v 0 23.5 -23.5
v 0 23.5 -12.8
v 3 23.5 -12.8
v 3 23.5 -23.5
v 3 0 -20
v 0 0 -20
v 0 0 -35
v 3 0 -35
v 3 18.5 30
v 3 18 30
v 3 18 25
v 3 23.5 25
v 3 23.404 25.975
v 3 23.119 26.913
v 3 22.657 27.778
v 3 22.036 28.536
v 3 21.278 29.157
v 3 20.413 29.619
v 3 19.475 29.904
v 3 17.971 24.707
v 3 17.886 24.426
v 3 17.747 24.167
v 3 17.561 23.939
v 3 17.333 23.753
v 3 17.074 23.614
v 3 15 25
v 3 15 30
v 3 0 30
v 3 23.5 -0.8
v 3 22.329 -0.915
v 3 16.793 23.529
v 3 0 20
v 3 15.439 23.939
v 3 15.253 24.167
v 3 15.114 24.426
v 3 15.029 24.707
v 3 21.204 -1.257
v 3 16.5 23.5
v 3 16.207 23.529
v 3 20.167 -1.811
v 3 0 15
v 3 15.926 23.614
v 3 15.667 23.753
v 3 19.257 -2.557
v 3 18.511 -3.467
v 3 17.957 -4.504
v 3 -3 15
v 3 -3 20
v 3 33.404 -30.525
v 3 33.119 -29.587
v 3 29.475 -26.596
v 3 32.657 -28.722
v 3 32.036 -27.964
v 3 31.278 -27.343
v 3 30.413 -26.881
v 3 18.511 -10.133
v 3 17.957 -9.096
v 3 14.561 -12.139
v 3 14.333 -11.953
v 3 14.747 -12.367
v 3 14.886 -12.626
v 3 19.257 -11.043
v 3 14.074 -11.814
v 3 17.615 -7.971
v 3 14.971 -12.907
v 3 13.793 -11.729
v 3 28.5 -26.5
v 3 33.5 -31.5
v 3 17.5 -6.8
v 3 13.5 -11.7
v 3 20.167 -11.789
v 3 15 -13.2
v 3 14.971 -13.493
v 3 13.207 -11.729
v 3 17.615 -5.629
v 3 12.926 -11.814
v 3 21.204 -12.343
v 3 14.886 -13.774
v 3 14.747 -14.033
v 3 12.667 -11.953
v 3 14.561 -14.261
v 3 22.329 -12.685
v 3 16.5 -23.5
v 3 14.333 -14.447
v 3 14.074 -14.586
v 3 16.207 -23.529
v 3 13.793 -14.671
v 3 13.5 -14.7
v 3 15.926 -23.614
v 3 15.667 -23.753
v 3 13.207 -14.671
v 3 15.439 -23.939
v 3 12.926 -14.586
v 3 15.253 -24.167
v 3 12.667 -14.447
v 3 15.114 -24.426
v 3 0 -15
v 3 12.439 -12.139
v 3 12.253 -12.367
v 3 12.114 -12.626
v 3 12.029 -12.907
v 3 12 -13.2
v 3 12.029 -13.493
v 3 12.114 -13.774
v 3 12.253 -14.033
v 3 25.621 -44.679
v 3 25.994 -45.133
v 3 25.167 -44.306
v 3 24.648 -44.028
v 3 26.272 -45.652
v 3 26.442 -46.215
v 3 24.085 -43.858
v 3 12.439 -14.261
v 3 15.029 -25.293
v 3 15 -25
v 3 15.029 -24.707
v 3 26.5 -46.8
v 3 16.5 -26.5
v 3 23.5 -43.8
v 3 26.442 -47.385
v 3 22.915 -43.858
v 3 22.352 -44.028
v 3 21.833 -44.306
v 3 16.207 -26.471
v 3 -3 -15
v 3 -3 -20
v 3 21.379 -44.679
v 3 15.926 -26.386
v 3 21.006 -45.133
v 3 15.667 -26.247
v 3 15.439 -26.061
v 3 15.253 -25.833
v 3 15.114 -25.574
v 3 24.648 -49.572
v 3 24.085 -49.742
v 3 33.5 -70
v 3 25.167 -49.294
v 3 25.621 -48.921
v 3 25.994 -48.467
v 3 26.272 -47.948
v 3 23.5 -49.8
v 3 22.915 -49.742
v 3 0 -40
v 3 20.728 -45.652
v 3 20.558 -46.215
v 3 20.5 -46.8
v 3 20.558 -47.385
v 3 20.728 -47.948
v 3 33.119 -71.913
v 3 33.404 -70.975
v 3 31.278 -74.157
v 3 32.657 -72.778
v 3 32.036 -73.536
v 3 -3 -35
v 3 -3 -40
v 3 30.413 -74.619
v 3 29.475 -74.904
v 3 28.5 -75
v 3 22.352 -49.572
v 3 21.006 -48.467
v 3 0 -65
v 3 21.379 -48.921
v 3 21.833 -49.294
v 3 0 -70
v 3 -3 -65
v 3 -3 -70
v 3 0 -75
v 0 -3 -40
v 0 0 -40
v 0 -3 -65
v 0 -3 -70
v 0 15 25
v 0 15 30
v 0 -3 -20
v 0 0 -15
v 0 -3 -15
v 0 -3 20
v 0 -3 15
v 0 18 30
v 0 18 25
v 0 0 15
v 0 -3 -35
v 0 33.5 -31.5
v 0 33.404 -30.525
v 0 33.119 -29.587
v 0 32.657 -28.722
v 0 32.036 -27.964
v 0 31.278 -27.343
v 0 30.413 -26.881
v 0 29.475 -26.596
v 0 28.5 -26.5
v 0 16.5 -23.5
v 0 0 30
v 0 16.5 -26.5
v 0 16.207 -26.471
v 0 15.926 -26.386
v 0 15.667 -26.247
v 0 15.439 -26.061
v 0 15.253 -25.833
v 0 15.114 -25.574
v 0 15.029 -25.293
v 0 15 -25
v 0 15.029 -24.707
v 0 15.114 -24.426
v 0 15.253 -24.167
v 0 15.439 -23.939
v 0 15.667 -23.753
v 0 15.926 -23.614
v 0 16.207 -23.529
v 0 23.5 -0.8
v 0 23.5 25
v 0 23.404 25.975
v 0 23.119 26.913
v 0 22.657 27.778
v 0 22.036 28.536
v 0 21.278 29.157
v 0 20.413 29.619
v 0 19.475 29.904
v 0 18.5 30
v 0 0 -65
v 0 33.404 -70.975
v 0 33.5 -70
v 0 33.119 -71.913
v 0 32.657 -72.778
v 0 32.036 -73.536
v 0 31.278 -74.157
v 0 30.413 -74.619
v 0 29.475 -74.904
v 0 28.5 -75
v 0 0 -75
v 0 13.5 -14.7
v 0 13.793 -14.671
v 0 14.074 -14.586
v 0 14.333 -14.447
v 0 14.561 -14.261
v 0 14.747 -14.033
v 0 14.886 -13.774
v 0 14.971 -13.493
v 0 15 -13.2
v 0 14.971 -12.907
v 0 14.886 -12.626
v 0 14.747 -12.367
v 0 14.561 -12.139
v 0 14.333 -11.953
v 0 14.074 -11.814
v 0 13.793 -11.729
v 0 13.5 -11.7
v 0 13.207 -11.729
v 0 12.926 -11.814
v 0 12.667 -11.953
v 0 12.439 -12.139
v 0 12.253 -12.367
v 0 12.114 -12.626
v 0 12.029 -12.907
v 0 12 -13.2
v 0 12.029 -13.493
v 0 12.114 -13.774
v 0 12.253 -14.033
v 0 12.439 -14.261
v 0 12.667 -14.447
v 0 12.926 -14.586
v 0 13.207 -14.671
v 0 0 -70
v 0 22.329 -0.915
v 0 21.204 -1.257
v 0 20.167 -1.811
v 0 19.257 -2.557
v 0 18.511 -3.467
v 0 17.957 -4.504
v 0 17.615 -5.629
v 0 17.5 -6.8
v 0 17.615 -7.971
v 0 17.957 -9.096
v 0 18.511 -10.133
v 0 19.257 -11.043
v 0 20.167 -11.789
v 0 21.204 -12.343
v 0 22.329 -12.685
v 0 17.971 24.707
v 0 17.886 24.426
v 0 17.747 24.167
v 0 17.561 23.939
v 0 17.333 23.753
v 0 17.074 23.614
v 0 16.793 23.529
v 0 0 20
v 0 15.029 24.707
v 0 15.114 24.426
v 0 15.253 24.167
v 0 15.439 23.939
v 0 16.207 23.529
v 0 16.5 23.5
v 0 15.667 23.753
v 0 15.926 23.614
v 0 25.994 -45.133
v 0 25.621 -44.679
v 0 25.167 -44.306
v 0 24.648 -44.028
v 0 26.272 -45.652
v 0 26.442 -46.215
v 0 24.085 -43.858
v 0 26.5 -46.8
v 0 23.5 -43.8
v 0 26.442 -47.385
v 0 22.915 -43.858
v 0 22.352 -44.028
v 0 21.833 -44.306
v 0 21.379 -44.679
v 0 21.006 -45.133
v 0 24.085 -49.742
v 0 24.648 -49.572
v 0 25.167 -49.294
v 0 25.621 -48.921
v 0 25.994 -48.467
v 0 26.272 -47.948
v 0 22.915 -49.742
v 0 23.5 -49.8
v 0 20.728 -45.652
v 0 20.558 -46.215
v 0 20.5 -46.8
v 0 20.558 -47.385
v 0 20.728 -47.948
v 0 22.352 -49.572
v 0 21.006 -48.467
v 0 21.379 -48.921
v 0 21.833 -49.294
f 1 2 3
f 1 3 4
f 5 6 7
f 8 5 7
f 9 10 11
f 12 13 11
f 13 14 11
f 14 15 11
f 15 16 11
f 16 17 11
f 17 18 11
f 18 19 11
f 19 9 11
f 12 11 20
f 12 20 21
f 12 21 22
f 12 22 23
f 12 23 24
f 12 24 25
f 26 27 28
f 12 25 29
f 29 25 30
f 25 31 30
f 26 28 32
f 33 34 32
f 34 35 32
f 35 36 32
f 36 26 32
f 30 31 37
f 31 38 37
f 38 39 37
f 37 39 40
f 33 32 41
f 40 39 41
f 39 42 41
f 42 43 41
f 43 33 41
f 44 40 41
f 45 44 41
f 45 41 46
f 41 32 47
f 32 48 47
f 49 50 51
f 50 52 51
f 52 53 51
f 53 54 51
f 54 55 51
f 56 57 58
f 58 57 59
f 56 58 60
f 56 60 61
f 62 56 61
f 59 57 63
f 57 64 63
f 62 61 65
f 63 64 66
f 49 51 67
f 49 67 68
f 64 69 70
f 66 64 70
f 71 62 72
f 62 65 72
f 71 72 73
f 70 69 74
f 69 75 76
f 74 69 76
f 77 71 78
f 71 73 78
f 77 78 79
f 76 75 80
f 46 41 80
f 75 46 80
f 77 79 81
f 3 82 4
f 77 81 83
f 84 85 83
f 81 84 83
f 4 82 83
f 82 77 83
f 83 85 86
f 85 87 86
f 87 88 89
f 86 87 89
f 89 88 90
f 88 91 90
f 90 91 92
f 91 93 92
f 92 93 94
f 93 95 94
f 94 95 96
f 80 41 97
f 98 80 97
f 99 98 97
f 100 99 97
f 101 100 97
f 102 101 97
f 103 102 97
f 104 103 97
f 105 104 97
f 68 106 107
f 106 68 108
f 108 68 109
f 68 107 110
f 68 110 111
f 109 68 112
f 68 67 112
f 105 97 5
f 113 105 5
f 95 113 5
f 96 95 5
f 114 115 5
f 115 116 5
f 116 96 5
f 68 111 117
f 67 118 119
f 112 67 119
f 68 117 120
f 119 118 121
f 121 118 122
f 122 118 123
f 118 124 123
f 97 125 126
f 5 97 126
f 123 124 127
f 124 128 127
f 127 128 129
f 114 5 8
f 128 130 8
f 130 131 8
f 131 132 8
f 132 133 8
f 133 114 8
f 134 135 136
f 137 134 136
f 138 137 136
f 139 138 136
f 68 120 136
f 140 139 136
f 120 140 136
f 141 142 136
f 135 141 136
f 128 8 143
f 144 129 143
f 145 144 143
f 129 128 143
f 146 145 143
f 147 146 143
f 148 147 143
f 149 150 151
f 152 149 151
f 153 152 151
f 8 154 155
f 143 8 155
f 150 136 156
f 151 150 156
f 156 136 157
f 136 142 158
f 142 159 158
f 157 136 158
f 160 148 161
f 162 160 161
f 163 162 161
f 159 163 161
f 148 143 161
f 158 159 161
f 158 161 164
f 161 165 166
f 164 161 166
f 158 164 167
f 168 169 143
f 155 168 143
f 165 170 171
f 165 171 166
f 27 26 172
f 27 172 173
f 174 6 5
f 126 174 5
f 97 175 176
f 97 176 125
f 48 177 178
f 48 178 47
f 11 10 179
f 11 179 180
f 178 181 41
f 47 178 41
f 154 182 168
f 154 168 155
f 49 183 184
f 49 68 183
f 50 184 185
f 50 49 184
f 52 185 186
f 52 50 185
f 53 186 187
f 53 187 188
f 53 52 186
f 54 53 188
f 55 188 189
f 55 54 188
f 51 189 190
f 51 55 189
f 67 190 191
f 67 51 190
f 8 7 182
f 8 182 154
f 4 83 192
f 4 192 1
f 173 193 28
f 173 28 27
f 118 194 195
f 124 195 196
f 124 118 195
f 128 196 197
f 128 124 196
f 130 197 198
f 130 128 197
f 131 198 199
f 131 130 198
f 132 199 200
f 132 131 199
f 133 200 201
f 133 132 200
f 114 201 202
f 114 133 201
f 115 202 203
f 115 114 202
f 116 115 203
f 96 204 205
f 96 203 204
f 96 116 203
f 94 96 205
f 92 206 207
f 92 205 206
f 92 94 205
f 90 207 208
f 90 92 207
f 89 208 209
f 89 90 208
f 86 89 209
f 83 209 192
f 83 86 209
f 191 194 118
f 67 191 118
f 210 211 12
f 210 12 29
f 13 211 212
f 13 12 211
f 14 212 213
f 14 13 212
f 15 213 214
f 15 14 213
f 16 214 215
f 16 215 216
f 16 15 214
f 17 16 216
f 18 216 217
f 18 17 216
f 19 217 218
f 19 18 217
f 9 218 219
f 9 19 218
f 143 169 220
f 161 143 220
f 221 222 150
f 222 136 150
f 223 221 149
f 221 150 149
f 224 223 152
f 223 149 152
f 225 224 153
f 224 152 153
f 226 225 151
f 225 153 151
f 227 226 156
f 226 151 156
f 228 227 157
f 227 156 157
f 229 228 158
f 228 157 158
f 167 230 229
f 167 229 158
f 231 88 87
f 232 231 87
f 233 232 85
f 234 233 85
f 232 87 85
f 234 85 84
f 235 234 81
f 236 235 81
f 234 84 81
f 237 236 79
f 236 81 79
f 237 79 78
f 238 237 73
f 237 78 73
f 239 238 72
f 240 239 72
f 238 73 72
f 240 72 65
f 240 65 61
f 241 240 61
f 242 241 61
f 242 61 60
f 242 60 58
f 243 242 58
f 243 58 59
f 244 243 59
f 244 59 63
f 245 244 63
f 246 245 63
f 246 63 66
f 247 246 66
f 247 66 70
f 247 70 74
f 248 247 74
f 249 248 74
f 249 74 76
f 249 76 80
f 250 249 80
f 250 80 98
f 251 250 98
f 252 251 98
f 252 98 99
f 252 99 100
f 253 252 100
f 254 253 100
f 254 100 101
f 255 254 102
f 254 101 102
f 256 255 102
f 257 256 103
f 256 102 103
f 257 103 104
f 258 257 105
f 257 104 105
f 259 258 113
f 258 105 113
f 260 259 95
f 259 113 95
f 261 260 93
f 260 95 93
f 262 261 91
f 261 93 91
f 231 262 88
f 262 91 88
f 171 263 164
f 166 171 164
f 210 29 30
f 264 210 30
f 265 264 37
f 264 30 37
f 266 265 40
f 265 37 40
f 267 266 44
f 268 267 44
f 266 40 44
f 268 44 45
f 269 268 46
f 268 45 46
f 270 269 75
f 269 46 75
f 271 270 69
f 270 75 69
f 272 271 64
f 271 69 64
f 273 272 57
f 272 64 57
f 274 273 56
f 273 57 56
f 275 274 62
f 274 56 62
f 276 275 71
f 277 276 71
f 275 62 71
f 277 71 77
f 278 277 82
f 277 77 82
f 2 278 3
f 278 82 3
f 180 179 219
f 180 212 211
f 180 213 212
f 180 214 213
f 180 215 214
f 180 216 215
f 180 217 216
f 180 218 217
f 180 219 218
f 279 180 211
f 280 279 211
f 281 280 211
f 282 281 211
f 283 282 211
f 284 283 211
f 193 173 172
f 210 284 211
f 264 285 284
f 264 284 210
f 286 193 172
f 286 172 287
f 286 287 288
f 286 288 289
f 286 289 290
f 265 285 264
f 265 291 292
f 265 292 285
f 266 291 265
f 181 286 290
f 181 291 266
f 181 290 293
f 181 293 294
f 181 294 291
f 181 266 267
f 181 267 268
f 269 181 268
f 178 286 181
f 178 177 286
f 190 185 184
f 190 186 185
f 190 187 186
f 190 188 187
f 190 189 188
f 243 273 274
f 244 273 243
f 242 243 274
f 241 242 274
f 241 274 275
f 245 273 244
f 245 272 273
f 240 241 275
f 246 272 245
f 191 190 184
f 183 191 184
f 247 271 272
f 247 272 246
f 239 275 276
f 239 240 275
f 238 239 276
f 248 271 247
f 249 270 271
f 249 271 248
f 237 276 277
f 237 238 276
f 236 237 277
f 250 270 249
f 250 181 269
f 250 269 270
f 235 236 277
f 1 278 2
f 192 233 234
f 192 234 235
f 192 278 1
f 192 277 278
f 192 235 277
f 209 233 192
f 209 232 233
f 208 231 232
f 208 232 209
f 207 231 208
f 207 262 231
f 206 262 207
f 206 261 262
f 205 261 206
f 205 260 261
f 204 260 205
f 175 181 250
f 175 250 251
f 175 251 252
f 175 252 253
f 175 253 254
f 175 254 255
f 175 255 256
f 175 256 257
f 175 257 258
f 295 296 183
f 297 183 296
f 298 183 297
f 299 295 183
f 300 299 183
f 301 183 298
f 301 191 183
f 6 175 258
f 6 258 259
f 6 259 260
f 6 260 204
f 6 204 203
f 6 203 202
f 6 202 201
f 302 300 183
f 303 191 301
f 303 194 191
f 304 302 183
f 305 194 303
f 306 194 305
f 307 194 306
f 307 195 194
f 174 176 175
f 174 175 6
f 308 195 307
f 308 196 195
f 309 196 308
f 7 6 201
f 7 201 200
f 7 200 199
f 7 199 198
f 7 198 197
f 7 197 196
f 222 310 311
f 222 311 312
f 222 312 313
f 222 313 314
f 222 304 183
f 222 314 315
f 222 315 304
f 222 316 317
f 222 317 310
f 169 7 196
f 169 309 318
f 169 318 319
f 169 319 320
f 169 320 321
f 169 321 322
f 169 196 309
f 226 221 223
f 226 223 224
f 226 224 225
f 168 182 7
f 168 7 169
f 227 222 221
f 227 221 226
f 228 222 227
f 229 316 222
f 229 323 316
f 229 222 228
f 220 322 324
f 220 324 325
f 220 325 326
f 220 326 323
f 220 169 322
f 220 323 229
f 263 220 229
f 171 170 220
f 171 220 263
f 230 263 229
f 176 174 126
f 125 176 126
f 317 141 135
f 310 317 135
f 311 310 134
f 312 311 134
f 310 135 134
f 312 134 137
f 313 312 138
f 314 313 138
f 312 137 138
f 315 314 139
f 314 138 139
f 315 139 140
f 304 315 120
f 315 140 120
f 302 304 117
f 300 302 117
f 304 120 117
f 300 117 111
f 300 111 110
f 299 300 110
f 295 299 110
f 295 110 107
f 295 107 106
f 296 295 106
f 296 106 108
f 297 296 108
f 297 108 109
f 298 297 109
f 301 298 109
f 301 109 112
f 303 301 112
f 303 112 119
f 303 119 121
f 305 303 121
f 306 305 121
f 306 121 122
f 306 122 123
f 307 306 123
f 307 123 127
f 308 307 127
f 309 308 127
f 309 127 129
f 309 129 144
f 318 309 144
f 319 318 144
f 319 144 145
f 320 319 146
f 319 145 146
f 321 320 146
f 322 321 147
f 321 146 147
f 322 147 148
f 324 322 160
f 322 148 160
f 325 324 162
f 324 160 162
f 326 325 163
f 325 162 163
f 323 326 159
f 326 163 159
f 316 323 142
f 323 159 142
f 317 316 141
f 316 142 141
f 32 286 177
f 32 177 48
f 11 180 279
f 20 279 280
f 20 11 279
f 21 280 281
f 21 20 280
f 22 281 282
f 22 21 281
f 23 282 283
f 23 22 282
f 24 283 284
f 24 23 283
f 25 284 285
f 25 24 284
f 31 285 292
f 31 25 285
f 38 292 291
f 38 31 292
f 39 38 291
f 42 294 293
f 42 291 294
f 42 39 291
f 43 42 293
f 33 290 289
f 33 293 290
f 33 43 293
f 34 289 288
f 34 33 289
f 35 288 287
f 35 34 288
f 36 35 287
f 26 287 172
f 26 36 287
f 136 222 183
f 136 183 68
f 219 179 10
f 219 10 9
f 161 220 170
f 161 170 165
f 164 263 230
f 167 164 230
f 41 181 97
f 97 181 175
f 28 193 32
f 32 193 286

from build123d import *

# Parameters (mm, degrees)
SKETCH1_W           = 105
SKETCH1_H           = 23.5
BOSS_EXTRUDE1_DEPTH = 3
SKETCH2_R           = 6
SKETCH2_R_2         = 1.5
CUT_EXTRUDE1_DEPTH  = 4
CUT_EXTRUDE2_DEPTH  = 4
SKETCH4_W           = 3
SKETCH4_H           = 5
BOSS_EXTRUDE2_DEPTH = 3
CUT_EXTRUDE4_DEPTH  = 4
SKETCH5_W           = 3
SKETCH5_H           = 5
BOSS_EXTRUDE3_DEPTH = 3
SKETCH9_W           = 3
SKETCH9_H           = 48.5
BOSS_EXTRUDE5_DEPTH = 10
SKETCH10_R          = 3
CUT_EXTRUDE5_DEPTH  = 4
FILLET5_R           = 5


with BuildPart() as part:
    # Sketch1 → Boss-Extrude1 (new body)
    with BuildSketch(Plane(origin=(0, 0, 0), x_dir=(0, 0, -1), z_dir=(1, 0, 0))):
        with Locations((22.5, 11.75)):
            Rectangle(SKETCH1_W, SKETCH1_H)
    extrude(amount=BOSS_EXTRUDE1_DEPTH)

    # Sketch2 → Cut-Extrude1 (cut, through all)
    with BuildSketch(Plane(origin=(3, 0, 0), x_dir=(0, 0, -1), z_dir=(1, 0, 0))):
        with Locations((6.8, 23.5)):
            Circle(SKETCH2_R)
        with Locations((13.2, 13.5)):
            Circle(SKETCH2_R_2)
    extrude(amount=-CUT_EXTRUDE1_DEPTH, mode=Mode.SUBTRACT)

    # Sketch3 → Cut-Extrude2 (cut, through all)
    with BuildSketch(Plane(origin=(3, 0, 0), x_dir=(0, 0, -1), z_dir=(1, 0, 0))):
        with BuildLine():
            Line((-25, 15), (-30, 15))
            Line((-30, 15), (-30, 18))
            Line((-30, 18), (-25, 18))
            ThreePointArc((-25, 18), (-23.5, 16.5), (-25, 15))
        make_face()
    extrude(amount=-CUT_EXTRUDE2_DEPTH, mode=Mode.SUBTRACT)

    # Sketch4 → Boss-Extrude2 (add)
    with BuildSketch(Plane.XZ):
        with Locations((1.5, 17.5)):
            Rectangle(SKETCH4_W, SKETCH4_H)
    boss_extrude2 = extrude(amount=BOSS_EXTRUDE2_DEPTH)

    # Mirror4: Boss-Extrude2 across plane
    add(boss_extrude2.mirror(Plane.XY))

    # Sketch8 → Cut-Extrude4 (cut, through all)
    with BuildSketch(Plane(origin=(3, 0, 0), x_dir=(0, 0, -1), z_dir=(1, 0, 0))):
        with BuildLine():
            Line((23.5, 16.5), (23.5, 23.5))
            Line((23.5, 23.5), (26.5, 23.5))
            Line((26.5, 23.5), (26.5, 16.5))
            ThreePointArc((26.5, 16.5), (25, 15), (23.5, 16.5))
        make_face()
    extrude(amount=-CUT_EXTRUDE4_DEPTH, mode=Mode.SUBTRACT)

    # Sketch5 → Boss-Extrude3 (add)
    with BuildSketch(Plane.XZ):
        with Locations((1.5, -37.5)):
            Rectangle(SKETCH5_W, SKETCH5_H)
        with Locations((1.5, -67.5)):
            Rectangle(SKETCH5_W, SKETCH5_H)
    extrude(amount=BOSS_EXTRUDE3_DEPTH)

    # Sketch9 → Boss-Extrude5 (add)
    with BuildSketch(Plane(origin=(0, 23.5, 0), x_dir=(1, 0, 0), z_dir=(0, 1, 0))):
        with Locations((1.5, 50.75)):
            Rectangle(SKETCH9_W, SKETCH9_H)
    extrude(amount=BOSS_EXTRUDE5_DEPTH)

    # Sketch10 → Cut-Extrude5 (cut, through all)
    with BuildSketch(Plane(origin=(3, 0, 0), x_dir=(0, 0, -1), z_dir=(1, 0, 0))):
        with Locations((46.8, 23.5)):
            Circle(SKETCH10_R)
    extrude(amount=-CUT_EXTRUDE5_DEPTH, mode=Mode.SUBTRACT)

    # Fillet5
    fillet5_edges = [part.edges().sort_by_distance(p)[0] for p in [
        (1.5, 33.5, -26.5),
        (1.5, 33.5, -75),
        (1.5, 23.5, 30),
    ]]
    fillet(fillet5_edges, radius=FILLET5_R)


solid = part.part
